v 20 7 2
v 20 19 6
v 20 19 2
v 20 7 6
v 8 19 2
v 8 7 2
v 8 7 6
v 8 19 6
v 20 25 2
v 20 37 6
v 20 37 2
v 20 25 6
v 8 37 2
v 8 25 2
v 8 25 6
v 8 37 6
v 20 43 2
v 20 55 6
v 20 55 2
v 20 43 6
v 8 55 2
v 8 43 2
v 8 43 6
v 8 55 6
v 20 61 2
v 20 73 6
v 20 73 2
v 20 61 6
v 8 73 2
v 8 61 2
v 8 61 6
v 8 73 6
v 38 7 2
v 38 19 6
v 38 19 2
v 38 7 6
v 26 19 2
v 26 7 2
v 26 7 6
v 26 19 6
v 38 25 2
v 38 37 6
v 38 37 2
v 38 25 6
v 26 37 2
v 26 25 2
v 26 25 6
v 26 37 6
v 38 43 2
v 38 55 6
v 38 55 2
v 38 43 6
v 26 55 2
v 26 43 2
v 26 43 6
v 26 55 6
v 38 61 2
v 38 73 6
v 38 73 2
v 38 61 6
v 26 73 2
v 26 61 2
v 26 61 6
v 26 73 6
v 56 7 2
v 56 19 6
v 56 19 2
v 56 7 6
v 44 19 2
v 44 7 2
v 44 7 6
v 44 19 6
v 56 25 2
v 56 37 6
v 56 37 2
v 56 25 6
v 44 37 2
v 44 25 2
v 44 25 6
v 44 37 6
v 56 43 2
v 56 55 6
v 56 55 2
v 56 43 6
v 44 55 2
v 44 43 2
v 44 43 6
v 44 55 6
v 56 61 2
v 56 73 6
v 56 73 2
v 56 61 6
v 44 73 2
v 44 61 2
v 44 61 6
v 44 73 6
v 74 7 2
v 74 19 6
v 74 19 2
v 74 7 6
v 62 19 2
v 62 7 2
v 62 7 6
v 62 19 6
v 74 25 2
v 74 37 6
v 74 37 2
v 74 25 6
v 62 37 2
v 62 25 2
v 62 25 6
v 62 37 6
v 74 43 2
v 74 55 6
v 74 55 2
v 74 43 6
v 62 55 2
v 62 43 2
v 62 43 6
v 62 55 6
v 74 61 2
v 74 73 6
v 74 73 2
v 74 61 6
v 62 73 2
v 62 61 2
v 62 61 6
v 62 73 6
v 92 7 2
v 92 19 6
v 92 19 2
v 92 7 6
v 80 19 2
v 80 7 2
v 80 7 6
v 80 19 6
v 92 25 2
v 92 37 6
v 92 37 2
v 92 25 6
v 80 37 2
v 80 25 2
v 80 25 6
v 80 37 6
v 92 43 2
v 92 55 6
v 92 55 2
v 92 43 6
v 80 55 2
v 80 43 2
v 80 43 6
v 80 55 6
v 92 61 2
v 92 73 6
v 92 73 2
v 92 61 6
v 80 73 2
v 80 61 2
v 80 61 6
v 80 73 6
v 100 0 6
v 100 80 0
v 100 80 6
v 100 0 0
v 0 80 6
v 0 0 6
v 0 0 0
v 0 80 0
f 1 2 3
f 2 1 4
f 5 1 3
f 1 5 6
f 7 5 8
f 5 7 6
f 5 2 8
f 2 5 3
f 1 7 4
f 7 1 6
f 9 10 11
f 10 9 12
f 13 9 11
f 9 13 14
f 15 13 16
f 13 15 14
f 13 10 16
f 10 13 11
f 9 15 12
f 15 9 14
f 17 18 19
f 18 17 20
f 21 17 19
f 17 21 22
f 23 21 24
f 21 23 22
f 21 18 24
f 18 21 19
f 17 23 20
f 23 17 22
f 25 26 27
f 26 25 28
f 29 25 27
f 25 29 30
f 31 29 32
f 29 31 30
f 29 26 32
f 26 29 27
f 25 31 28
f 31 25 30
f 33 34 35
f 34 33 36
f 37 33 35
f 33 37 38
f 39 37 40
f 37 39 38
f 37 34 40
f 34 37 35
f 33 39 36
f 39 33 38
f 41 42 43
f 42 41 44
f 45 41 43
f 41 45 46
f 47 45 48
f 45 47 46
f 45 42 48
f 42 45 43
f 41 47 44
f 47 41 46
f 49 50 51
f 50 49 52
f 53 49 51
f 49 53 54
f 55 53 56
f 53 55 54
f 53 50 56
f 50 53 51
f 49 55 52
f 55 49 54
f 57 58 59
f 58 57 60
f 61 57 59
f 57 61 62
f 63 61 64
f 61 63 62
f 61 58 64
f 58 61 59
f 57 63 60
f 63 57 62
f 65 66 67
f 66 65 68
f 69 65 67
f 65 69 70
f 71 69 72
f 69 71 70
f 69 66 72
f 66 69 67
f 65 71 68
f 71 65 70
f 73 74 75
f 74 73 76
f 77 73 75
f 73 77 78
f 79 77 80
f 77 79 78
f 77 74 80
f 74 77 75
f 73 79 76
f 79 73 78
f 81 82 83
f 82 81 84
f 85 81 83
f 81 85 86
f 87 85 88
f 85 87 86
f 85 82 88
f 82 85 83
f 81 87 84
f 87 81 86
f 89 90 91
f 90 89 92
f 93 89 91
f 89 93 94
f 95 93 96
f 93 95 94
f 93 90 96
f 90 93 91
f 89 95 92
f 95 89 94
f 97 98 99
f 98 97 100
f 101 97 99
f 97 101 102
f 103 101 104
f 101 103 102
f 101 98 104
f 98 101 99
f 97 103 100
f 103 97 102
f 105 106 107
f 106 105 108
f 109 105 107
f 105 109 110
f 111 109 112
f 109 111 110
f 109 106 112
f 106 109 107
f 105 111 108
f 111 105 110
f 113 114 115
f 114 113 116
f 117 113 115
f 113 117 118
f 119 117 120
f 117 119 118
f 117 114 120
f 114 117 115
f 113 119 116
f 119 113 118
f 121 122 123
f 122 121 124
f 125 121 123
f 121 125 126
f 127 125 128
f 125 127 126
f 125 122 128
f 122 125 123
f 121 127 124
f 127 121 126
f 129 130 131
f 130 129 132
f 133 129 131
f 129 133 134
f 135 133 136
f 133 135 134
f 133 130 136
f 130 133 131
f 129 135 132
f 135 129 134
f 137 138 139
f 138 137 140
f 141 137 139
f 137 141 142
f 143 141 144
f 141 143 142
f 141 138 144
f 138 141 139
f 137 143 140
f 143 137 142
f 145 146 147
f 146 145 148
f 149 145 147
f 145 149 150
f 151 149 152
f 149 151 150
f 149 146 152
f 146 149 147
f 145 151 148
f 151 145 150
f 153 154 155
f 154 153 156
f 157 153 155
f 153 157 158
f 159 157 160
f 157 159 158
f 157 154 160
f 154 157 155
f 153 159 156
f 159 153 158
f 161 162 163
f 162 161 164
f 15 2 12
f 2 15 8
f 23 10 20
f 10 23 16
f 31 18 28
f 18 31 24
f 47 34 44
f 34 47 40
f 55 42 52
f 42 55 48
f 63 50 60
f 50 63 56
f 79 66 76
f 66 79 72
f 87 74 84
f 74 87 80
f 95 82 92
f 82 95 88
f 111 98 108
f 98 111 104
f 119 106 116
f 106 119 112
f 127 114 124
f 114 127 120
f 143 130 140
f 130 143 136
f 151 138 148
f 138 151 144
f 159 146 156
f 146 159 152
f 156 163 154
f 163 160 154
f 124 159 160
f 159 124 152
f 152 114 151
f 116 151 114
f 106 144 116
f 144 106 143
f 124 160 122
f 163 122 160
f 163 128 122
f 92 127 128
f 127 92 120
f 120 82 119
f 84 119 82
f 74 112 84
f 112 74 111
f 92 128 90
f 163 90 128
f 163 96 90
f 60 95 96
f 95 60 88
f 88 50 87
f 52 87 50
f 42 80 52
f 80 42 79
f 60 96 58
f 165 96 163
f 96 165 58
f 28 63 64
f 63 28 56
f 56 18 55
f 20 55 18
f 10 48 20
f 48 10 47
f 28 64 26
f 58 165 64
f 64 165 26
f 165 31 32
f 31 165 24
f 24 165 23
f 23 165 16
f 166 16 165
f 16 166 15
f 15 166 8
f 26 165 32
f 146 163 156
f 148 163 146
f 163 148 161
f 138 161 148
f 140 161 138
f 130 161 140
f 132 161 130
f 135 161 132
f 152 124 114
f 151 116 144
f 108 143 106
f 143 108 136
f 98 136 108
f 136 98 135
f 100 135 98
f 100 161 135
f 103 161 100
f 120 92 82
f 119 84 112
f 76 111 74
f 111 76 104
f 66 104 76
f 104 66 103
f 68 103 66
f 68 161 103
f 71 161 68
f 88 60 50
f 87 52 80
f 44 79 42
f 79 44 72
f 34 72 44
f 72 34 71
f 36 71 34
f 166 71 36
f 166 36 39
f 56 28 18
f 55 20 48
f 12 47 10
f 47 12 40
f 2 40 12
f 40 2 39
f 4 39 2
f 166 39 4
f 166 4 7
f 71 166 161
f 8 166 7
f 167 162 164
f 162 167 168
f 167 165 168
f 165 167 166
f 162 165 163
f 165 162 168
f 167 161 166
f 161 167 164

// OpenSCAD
$fn=64;
module die_tray() {
  difference() {
    cube([100,80,6]);
    for(ix=[0:4]) for(iy=[0:3])
      translate([8+ix*18,7+iy*18,2]) cube([12,12,5]);
  }
}
die_tray();
